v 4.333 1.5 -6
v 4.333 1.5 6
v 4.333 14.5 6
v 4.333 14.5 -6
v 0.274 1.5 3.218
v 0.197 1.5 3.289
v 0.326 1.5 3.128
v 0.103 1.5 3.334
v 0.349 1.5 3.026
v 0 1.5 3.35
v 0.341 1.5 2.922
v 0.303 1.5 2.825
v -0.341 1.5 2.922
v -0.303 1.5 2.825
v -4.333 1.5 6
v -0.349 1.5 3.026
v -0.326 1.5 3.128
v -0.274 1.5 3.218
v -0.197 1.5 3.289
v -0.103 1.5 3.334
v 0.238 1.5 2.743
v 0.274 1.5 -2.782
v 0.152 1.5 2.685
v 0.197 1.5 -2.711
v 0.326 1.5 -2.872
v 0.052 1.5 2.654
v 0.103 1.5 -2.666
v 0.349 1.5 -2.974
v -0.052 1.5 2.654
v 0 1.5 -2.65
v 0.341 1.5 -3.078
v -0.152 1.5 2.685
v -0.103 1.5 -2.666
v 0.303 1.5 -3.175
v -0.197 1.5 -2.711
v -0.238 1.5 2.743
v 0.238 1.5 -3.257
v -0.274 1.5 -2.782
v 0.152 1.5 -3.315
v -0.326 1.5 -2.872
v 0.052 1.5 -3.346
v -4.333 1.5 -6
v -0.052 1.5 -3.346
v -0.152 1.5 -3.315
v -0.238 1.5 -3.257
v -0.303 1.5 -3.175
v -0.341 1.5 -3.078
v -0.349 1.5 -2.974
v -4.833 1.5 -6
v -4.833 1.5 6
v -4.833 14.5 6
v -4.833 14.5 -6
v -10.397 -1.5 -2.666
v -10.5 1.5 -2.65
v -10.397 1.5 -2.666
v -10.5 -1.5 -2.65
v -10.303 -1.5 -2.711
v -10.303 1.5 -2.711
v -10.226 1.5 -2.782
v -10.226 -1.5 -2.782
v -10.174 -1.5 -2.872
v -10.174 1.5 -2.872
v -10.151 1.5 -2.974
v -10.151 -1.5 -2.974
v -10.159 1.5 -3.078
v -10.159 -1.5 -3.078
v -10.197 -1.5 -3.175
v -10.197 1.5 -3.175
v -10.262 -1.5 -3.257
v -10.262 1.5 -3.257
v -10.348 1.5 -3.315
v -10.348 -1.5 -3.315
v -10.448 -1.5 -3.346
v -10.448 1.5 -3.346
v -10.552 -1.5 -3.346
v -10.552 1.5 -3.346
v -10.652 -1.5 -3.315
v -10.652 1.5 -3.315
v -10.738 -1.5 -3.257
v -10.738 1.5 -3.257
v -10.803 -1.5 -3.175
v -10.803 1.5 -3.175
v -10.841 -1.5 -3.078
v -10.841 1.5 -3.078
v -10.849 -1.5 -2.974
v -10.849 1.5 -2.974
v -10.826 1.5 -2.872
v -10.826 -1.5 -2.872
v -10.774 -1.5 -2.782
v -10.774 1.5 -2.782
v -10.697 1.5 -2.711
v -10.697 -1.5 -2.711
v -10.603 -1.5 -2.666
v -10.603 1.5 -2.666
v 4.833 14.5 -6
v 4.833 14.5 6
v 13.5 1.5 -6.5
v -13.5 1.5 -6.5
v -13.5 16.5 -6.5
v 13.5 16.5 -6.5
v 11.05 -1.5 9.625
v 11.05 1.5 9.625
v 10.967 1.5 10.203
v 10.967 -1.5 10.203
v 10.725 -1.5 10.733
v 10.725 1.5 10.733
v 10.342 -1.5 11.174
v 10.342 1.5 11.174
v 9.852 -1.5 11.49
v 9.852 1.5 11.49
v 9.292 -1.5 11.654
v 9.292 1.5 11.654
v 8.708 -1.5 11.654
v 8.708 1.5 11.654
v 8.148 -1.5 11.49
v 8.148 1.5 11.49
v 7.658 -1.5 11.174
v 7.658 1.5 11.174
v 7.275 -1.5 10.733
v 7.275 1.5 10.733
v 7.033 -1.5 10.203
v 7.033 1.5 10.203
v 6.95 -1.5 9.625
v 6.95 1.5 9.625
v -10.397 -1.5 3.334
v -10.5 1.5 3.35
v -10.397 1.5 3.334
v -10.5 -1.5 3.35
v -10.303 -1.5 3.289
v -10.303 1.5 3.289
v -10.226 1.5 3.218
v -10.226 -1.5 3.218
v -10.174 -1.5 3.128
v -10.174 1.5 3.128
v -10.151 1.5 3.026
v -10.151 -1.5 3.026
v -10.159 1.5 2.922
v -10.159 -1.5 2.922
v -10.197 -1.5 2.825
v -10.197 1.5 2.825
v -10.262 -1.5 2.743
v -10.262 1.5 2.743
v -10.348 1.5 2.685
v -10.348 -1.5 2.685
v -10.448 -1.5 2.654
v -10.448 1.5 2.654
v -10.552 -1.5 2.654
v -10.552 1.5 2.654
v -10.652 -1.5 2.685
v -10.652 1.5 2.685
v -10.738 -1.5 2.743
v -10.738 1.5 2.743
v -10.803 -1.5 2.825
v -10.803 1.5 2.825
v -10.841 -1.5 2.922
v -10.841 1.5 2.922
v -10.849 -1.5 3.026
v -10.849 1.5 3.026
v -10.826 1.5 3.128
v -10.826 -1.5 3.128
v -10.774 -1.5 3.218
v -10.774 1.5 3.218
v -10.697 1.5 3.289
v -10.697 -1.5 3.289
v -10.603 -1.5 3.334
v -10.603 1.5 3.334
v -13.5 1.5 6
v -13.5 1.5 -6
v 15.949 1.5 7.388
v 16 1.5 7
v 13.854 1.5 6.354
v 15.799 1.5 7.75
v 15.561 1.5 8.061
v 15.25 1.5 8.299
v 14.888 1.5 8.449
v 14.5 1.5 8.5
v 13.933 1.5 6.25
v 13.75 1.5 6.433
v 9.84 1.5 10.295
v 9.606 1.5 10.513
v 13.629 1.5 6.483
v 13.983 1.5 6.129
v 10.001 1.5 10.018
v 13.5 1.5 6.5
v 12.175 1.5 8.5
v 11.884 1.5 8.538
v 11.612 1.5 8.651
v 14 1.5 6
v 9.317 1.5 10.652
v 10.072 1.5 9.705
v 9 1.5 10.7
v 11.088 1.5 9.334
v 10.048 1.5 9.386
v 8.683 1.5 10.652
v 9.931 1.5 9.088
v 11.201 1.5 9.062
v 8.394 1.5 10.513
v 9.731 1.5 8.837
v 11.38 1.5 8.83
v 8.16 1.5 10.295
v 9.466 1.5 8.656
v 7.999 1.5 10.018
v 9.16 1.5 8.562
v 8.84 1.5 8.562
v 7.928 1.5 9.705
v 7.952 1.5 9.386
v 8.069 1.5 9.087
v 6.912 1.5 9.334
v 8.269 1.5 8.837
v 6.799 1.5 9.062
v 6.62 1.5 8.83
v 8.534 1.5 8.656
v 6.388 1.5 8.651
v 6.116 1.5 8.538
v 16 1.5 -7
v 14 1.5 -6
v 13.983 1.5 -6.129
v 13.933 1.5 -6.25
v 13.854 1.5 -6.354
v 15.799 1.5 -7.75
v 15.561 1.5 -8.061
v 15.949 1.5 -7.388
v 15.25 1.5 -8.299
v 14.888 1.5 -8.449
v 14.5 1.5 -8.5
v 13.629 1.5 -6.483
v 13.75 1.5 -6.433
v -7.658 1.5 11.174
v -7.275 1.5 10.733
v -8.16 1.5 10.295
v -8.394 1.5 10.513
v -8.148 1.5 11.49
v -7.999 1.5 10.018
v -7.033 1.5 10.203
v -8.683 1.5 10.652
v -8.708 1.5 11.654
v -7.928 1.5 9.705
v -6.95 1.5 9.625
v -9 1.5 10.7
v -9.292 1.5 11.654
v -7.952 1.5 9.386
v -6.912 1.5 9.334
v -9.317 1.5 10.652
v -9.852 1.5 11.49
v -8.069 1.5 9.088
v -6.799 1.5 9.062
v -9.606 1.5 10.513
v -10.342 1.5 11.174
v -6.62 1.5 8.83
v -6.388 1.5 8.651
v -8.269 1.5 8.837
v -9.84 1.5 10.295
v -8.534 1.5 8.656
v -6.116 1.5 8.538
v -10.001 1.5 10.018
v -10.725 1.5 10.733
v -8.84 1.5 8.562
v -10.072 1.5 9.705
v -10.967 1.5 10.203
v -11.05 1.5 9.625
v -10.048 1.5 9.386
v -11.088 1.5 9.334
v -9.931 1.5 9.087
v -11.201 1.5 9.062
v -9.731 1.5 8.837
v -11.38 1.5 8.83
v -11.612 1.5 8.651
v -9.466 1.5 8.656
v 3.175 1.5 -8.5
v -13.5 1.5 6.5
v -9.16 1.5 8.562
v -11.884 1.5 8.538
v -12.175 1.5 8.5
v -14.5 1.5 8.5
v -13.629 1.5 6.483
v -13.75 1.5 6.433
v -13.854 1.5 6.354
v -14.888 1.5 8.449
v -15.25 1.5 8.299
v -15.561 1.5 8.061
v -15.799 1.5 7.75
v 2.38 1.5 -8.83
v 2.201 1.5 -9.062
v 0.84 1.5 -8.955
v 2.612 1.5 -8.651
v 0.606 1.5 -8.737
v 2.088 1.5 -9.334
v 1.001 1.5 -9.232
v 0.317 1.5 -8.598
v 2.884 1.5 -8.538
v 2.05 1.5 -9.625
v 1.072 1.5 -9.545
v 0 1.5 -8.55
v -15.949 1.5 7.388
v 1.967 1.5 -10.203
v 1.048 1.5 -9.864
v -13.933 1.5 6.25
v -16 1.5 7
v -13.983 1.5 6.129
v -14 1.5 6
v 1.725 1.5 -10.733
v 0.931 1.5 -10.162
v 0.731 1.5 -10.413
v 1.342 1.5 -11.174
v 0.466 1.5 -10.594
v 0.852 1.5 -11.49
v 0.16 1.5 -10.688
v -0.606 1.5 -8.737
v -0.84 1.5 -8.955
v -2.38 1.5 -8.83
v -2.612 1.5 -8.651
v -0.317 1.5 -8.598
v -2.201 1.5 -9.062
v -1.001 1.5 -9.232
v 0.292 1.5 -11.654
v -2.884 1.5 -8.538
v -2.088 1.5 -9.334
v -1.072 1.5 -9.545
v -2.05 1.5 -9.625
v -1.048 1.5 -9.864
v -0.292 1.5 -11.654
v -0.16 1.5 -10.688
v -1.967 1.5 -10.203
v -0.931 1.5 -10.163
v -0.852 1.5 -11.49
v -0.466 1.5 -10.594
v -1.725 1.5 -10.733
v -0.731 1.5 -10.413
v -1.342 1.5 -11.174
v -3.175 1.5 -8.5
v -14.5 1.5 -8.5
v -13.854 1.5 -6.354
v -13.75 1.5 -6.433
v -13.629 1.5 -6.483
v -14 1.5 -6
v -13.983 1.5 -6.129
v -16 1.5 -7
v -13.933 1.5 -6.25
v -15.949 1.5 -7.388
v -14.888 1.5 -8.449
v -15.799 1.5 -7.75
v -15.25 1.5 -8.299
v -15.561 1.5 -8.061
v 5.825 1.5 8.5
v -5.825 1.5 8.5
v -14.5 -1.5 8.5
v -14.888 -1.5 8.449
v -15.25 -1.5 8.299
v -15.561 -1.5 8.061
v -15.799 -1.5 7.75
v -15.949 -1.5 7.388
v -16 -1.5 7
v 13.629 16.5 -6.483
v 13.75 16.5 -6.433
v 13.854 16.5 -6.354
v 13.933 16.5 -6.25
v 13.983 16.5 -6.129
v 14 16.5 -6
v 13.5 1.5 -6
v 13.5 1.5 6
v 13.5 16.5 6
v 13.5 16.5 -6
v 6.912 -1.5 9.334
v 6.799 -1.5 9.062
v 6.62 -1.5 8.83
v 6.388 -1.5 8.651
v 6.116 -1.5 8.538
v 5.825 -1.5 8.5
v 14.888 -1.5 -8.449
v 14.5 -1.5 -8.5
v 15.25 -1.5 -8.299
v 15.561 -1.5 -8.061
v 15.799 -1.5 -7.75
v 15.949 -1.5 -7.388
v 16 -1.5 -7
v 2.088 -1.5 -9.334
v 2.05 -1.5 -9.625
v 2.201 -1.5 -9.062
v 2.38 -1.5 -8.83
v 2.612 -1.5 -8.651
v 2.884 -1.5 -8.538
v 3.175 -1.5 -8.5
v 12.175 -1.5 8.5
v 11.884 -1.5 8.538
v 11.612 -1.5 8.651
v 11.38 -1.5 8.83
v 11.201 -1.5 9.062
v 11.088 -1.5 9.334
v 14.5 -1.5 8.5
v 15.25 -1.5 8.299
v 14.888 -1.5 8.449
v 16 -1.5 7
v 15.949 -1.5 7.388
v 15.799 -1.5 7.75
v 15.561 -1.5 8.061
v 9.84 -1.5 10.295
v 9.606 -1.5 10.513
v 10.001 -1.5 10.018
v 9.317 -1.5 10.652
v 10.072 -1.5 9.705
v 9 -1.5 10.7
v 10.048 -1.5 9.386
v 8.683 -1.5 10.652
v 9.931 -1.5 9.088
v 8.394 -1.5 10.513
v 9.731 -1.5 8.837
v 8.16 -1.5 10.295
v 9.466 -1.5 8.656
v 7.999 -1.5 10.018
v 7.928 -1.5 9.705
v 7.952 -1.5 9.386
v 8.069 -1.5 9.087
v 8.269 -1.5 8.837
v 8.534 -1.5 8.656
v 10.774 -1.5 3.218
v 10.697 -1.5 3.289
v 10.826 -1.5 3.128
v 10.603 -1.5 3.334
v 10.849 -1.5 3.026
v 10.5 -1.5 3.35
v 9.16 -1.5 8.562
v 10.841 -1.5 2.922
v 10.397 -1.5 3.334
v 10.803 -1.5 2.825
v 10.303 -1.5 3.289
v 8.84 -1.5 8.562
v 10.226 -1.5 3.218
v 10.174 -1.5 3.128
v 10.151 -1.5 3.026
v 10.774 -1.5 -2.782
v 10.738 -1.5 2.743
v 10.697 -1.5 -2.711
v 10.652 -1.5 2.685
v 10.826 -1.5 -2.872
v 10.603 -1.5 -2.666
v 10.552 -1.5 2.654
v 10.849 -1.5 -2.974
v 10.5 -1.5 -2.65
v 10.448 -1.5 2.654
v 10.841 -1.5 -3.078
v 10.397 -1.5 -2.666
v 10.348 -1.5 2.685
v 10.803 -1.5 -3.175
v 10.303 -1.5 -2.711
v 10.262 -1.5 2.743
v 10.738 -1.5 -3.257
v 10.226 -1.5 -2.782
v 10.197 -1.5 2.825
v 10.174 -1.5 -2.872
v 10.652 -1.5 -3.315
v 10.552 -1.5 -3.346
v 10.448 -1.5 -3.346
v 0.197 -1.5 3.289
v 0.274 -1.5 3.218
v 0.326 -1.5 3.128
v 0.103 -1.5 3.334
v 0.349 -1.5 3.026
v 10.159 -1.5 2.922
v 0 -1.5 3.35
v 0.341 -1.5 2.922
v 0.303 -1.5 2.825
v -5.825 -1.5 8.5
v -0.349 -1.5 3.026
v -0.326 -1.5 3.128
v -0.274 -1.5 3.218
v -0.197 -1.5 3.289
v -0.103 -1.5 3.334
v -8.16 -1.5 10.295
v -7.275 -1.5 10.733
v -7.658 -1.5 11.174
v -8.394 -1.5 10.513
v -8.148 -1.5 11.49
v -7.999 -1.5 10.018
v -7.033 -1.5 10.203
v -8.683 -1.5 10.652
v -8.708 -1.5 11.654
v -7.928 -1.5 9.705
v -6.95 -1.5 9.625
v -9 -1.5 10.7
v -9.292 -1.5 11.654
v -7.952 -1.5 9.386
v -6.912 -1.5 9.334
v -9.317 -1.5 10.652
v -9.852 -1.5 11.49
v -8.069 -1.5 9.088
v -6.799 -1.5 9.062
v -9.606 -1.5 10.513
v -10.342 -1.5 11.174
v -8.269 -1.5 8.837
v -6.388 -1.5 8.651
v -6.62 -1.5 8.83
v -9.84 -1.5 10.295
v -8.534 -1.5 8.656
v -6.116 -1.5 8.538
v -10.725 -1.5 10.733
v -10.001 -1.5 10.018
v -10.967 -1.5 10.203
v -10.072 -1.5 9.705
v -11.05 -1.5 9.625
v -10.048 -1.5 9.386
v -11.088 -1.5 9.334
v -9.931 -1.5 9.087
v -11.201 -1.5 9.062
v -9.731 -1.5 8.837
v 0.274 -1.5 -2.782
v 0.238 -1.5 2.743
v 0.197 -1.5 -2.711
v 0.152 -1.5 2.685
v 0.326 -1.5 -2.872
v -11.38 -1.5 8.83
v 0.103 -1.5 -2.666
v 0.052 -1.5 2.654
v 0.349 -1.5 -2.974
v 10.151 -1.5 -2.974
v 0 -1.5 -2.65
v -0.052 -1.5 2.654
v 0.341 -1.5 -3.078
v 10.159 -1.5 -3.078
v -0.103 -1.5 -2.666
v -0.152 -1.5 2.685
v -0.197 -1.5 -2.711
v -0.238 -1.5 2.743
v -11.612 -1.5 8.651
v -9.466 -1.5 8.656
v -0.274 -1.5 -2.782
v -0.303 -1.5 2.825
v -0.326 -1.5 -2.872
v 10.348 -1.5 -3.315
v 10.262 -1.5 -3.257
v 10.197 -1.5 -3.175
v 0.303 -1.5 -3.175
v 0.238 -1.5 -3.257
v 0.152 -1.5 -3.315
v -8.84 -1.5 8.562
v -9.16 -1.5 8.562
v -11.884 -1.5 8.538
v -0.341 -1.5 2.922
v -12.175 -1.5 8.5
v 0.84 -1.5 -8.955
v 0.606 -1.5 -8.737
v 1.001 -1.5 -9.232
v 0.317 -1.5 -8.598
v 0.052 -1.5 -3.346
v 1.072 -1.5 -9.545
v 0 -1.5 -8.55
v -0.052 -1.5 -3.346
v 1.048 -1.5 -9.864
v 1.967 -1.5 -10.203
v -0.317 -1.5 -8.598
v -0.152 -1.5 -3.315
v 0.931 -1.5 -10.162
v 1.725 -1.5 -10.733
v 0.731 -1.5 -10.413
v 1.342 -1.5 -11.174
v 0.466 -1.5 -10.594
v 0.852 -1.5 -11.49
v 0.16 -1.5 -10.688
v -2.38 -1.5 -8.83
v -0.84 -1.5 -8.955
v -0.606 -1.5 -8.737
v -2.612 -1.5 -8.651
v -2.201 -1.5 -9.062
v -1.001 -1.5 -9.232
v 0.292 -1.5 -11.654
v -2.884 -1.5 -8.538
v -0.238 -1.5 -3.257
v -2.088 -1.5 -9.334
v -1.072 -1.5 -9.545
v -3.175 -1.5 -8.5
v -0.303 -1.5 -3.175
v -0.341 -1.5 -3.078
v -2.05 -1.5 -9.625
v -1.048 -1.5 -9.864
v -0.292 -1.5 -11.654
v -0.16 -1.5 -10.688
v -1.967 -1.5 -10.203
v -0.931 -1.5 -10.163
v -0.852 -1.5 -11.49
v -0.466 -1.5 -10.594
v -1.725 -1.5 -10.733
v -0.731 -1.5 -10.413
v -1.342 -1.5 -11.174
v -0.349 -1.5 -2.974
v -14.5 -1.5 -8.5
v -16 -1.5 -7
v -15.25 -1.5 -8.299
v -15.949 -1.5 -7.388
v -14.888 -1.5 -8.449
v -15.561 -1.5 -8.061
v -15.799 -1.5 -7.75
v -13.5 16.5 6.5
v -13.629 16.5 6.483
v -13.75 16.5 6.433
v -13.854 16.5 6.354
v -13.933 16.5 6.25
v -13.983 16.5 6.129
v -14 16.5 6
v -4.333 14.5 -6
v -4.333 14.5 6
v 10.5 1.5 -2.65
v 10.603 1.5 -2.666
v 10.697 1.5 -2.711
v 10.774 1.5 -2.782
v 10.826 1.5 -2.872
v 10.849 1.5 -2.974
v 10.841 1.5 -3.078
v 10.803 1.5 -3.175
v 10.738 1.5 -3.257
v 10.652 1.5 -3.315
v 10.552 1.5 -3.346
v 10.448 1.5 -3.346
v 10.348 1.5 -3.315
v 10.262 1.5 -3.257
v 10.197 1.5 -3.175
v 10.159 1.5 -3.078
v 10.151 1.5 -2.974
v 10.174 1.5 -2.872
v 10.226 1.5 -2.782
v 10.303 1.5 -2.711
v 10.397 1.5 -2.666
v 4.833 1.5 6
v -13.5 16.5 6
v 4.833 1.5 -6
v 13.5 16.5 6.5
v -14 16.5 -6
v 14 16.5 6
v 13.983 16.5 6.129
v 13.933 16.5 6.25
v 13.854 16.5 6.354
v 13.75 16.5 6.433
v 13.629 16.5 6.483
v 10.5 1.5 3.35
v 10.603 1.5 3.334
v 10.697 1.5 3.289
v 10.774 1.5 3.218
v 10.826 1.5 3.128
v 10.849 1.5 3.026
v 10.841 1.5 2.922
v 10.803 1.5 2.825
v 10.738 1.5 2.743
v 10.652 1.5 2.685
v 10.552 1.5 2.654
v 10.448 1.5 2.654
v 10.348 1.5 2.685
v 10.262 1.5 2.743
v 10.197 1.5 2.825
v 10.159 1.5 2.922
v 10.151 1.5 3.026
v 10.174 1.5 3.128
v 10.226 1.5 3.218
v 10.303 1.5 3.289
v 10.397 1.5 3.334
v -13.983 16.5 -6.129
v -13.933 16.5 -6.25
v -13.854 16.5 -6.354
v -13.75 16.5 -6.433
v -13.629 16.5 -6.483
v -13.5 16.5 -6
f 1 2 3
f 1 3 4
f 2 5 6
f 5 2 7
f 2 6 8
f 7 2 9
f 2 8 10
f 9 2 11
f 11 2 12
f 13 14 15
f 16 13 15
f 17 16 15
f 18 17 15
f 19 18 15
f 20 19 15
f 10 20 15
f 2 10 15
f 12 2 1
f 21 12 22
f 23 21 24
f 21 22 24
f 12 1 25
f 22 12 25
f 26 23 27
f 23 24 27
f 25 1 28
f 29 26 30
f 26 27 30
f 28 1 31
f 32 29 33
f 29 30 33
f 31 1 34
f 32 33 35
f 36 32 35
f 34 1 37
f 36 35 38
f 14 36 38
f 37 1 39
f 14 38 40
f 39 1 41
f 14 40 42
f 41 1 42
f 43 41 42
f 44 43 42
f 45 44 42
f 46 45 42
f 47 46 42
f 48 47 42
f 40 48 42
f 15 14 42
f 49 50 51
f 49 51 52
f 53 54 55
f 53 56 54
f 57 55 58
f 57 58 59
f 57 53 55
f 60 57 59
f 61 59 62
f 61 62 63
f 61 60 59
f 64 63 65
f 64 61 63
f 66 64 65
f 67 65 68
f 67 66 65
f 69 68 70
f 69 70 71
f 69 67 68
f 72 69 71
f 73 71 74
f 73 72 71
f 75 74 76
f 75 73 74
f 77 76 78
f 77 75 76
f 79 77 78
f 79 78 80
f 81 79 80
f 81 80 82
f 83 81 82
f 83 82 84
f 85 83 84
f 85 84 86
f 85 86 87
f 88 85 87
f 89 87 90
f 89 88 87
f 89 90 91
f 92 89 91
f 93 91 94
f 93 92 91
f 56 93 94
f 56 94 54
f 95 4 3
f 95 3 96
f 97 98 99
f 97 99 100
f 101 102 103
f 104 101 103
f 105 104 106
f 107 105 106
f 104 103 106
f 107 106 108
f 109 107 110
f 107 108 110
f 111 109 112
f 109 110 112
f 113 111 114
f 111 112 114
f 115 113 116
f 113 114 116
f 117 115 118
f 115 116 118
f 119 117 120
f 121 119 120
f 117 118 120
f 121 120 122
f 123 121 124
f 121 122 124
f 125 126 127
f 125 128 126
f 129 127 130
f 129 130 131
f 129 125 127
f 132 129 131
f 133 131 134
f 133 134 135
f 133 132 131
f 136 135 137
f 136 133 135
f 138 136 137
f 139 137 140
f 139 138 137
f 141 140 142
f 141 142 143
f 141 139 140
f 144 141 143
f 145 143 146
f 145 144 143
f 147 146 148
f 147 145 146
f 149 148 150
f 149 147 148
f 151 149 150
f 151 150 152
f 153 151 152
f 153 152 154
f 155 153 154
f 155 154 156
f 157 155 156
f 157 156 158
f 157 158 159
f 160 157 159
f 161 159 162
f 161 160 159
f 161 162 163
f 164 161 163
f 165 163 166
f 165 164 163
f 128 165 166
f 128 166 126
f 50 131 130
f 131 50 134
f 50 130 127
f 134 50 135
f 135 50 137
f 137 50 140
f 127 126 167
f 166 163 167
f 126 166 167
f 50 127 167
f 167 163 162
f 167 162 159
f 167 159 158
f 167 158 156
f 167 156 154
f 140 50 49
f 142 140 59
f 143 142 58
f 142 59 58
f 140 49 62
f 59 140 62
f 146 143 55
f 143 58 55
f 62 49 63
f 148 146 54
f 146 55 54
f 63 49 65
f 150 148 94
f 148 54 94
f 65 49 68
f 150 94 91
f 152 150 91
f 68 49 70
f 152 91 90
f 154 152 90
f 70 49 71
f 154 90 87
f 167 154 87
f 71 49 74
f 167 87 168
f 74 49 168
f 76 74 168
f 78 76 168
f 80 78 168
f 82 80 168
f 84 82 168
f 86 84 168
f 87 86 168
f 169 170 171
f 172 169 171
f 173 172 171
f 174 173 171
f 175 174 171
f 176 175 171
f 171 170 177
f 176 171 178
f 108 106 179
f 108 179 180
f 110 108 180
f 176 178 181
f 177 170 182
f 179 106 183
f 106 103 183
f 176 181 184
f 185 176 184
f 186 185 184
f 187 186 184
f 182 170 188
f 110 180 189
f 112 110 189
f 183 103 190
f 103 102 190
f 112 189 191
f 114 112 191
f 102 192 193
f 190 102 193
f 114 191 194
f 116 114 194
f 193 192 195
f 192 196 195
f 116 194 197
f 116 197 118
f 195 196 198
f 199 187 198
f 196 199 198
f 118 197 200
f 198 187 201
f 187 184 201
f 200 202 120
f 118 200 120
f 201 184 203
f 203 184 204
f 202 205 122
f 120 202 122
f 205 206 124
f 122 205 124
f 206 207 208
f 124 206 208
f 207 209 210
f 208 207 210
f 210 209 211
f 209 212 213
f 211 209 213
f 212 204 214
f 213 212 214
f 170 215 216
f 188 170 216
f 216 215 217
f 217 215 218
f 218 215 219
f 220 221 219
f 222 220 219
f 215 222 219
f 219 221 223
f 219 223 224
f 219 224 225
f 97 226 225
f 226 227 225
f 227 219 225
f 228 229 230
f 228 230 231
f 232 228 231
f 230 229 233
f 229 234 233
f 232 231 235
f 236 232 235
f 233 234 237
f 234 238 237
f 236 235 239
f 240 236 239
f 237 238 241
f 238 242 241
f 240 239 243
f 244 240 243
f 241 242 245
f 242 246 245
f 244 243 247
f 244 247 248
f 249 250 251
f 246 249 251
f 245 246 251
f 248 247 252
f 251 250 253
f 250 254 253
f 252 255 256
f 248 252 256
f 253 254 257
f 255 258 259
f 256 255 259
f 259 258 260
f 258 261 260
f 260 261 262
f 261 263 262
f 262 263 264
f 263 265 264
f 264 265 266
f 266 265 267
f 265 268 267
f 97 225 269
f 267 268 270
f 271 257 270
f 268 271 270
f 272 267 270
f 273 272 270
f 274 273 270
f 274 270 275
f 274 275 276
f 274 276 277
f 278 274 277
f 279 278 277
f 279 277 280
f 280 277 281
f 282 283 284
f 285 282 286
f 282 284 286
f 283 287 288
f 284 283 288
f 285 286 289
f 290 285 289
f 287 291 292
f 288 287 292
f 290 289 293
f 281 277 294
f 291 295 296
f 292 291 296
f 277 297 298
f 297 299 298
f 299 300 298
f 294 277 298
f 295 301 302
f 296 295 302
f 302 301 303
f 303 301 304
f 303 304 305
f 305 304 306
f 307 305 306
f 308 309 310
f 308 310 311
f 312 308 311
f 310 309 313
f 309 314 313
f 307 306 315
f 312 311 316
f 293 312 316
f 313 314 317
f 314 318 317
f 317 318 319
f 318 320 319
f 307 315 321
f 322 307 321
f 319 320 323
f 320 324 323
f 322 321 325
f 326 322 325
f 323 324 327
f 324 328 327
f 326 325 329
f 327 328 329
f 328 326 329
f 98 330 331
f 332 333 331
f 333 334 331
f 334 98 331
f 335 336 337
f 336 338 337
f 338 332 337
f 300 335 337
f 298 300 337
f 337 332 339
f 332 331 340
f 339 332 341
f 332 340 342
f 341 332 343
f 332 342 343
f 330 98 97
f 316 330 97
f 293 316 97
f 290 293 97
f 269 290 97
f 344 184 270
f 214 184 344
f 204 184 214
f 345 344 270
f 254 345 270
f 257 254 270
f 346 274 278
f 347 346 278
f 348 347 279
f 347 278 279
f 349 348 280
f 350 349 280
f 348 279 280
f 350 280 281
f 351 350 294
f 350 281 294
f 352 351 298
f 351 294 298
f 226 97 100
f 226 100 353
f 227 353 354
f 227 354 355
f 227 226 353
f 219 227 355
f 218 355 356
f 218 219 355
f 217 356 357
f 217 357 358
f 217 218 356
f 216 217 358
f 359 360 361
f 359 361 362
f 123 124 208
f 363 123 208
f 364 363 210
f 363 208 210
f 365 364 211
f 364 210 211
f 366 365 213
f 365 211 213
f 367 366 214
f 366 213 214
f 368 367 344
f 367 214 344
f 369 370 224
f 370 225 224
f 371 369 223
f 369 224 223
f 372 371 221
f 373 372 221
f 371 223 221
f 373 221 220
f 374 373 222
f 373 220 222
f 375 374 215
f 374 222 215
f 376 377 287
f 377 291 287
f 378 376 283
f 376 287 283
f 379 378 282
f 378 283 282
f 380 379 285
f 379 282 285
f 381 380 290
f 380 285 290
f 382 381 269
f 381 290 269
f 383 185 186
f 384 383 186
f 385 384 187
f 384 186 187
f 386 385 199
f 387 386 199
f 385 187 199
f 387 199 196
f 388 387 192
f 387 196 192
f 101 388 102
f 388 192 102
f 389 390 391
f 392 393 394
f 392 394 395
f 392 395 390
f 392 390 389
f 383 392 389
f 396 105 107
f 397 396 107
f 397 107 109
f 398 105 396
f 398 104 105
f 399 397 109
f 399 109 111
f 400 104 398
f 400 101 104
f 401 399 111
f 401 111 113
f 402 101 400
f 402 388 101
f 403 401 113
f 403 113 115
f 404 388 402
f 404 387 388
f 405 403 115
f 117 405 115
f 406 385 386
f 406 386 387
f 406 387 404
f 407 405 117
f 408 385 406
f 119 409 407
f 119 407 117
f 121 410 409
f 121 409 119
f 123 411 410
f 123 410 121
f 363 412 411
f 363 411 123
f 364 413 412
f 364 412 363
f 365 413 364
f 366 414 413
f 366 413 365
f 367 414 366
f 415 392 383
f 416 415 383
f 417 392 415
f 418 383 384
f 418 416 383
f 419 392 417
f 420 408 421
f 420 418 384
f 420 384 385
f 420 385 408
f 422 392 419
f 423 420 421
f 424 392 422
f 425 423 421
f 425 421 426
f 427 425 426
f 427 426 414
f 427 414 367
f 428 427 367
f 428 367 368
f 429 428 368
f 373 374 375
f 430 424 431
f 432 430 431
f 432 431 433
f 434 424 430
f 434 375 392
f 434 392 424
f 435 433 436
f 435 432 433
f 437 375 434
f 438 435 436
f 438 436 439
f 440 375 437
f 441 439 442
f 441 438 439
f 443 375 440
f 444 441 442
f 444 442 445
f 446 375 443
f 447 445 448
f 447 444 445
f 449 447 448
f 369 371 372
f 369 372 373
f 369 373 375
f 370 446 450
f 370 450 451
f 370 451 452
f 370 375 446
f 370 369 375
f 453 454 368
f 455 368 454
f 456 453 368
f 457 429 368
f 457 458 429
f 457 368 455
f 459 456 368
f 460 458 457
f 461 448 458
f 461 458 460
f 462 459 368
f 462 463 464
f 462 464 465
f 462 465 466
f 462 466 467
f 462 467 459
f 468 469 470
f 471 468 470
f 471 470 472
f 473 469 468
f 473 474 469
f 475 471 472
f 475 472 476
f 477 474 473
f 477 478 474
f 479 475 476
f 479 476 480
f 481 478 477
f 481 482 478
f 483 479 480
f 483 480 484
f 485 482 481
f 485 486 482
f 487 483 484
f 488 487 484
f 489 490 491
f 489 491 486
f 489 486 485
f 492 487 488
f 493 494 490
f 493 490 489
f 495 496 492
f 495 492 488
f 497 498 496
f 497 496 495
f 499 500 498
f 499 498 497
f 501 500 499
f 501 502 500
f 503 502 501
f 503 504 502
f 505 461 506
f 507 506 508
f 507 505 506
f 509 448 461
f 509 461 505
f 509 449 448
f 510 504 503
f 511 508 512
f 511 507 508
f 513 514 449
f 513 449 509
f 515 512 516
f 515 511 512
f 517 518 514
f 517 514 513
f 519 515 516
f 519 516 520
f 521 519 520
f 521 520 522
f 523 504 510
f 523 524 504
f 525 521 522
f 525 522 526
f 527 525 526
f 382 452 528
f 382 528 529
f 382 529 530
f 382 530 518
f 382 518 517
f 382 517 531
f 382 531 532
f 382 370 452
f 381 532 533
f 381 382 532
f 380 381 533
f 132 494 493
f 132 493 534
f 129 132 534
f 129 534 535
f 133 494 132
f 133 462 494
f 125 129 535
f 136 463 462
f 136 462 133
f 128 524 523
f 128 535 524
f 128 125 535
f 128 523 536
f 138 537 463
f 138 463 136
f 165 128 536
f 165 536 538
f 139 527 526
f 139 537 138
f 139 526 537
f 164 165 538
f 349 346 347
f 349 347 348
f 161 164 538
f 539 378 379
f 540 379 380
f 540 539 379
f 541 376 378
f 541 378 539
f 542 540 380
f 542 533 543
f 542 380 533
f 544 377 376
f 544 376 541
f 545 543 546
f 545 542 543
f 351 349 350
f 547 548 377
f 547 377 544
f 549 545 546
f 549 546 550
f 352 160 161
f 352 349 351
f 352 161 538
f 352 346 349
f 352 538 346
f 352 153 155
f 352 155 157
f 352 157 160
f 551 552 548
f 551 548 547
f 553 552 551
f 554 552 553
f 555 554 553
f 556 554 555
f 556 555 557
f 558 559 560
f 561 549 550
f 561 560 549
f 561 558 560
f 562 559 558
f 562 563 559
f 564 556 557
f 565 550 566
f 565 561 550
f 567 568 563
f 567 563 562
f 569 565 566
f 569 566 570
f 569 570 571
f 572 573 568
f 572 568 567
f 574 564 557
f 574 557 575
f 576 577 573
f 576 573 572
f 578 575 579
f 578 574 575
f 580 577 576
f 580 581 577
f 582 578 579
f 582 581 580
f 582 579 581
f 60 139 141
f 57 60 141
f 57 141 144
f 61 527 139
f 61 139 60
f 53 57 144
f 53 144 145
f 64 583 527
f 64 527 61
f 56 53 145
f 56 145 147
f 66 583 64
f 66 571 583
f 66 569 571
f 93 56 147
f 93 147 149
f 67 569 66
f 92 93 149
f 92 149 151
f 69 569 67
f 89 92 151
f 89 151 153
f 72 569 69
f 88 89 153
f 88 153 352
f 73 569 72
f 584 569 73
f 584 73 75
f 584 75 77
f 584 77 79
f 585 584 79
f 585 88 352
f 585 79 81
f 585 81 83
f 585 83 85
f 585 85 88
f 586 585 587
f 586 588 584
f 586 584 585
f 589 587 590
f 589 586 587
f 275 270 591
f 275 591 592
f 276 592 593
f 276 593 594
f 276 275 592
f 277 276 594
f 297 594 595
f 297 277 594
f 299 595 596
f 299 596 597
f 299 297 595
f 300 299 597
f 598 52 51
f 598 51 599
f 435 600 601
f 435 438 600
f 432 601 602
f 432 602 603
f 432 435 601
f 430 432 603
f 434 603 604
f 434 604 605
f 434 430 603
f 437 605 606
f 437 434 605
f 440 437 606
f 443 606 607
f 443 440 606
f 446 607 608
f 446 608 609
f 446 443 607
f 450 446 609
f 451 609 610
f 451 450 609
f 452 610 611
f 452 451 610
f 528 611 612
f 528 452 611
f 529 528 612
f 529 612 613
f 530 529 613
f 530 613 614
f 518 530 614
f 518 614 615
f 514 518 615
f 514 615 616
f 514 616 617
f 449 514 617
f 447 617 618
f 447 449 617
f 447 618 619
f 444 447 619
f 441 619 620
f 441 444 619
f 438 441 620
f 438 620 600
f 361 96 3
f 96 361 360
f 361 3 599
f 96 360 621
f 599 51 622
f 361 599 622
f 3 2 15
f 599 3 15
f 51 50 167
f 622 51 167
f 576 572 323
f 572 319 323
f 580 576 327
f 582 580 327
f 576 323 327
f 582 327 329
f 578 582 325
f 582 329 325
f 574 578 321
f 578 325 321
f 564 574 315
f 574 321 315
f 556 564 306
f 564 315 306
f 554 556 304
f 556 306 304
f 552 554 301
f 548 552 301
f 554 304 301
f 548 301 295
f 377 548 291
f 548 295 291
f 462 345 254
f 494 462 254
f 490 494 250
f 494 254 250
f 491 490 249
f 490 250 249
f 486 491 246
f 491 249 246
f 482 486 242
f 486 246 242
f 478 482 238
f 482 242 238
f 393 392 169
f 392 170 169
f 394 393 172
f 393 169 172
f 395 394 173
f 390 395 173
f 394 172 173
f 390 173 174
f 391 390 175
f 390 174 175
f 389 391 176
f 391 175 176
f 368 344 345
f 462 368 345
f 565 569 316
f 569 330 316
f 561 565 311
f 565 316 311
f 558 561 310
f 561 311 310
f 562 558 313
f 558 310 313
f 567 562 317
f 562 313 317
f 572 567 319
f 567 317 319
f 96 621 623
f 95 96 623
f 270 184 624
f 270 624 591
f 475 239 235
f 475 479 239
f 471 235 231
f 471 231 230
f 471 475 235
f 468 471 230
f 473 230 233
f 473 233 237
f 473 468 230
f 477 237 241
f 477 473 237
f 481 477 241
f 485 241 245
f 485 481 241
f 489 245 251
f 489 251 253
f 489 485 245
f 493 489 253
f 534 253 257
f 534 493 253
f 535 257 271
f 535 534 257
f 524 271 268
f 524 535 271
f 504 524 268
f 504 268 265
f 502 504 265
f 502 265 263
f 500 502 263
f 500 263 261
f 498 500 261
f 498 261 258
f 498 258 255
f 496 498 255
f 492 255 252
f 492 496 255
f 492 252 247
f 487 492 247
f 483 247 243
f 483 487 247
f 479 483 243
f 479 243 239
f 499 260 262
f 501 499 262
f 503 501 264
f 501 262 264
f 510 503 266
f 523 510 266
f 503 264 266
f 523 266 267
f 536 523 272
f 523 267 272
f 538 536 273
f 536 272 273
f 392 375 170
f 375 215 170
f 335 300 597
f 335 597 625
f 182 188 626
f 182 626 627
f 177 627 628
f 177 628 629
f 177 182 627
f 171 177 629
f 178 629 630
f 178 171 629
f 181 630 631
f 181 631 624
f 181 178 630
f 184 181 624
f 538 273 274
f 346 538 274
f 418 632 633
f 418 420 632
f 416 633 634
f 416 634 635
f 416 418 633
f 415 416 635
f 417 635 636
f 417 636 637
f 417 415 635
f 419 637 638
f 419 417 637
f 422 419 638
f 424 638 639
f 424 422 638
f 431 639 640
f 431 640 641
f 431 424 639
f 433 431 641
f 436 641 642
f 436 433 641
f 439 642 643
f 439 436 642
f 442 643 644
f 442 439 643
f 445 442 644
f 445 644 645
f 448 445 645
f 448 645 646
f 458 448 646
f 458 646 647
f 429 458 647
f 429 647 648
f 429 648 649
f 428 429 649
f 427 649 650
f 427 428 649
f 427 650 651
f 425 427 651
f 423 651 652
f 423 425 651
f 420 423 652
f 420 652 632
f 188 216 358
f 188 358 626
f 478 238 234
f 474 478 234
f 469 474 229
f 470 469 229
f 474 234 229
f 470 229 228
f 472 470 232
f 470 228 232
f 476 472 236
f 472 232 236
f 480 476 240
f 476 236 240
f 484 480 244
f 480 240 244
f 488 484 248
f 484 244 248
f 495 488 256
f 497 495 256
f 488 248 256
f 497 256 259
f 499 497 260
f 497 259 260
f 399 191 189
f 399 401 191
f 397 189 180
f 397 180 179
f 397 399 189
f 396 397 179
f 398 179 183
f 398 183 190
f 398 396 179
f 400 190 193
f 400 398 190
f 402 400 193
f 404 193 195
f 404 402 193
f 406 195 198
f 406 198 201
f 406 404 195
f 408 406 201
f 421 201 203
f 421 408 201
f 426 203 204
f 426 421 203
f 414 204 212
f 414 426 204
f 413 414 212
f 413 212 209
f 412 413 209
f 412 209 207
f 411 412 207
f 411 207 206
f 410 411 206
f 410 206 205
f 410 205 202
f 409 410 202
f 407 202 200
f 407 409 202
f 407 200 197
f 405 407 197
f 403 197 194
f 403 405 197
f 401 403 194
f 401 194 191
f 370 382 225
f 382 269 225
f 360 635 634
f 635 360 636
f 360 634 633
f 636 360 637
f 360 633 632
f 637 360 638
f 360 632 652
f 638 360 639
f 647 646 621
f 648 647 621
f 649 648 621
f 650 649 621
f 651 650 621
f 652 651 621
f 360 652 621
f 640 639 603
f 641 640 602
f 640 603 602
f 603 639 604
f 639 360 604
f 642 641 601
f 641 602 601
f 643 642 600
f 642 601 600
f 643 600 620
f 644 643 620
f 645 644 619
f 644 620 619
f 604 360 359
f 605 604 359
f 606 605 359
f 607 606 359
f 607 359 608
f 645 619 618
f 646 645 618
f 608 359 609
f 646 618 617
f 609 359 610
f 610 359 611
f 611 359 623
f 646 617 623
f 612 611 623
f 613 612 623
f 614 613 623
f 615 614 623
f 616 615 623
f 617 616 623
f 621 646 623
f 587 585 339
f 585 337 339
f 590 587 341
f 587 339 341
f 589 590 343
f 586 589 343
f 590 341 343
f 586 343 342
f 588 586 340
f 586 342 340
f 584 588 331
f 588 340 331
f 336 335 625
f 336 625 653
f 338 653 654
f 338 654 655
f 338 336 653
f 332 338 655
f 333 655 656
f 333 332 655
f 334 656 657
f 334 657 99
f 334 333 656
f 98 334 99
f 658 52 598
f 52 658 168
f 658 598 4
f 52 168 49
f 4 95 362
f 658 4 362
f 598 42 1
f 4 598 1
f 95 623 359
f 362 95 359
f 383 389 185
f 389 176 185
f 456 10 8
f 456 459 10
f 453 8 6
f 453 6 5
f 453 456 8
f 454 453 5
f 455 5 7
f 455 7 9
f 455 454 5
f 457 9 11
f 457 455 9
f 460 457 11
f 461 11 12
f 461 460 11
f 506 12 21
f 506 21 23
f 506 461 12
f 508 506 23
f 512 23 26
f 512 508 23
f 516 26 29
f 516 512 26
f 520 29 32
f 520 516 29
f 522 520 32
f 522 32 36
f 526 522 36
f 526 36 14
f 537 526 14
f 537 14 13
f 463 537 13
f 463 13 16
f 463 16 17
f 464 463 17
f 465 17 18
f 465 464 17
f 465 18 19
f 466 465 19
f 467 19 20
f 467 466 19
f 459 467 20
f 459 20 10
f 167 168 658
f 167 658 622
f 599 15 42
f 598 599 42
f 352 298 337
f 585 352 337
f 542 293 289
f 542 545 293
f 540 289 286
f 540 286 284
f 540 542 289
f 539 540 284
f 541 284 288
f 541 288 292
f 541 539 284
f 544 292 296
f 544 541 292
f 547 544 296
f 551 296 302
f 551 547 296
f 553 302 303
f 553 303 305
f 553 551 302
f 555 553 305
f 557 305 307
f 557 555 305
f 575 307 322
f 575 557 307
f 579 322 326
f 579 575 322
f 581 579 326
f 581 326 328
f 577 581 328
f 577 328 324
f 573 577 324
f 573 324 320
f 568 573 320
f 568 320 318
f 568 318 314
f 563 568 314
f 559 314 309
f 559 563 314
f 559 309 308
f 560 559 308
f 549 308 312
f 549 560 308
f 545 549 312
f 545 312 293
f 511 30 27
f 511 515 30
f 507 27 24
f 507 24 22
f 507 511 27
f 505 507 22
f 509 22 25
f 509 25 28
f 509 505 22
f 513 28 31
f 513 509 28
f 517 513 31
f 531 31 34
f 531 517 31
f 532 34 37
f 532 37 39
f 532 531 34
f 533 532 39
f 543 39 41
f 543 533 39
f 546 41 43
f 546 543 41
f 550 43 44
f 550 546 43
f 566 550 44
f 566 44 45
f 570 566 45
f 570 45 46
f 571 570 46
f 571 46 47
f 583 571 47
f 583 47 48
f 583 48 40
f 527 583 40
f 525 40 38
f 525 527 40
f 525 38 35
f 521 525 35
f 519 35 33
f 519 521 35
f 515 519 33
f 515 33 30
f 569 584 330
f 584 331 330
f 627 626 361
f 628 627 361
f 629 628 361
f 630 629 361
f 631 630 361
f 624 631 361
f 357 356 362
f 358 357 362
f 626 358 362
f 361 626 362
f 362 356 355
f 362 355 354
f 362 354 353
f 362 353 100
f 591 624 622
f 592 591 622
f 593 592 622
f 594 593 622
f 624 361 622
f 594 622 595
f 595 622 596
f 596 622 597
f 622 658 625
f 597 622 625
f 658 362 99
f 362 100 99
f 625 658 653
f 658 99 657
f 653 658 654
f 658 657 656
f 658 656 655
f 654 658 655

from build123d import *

# Parameters (mm, degrees)
BASE_PLATE_AND_PORTS_2_R   = 0.35
BASE_PLATE_AND_PORTS_2_R_2 = 1.075
BASE_PLATE_AND_PORTS_DEPTH = 1.5
BOSS_EXTRUDE1_DEPTH        = 15
RESERVOIRS_3_W             = 0.5
RESERVOIRS_3_H             = 12
BOSS_EXTRUDE2_DEPTH        = 13


with BuildPart() as part:
    # Base-plate and ports 2 → Base plate and ports (new, symmetric)
    with BuildSketch(Plane(origin=(0, 0, 0), x_dir=(1, 0, 0), z_dir=(0, 1, 0))):
        with BuildLine():
            Line((-16, -7), (-16, 7))
            ThreePointArc((-16, 7), (-15.560660172, 8.060660172), (-14.5, 8.5))
            Line((-14.5, 8.5), (-3.175, 8.5))
            ThreePointArc((-3.175, 8.5), (-2.379504871, 8.829504871), (-2.05, 9.625))
            ThreePointArc((-2.05, 9.625), (0, 11.675), (2.05, 9.625))
            ThreePointArc((2.05, 9.625), (2.379504871, 8.829504871), (3.175, 8.5))
            Line((3.175, 8.5), (14.5, 8.5))
            ThreePointArc((14.5, 8.5), (15.560660172, 8.060660172), (16, 7))
            Line((16, 7), (16, -7))
            ThreePointArc((16, -7), (15.560660172, -8.060660172), (14.5, -8.5))
            Line((14.5, -8.5), (12.175, -8.5))
            ThreePointArc((12.175, -8.5), (11.379504871, -8.829504871), (11.05, -9.625))
            ThreePointArc((11.05, -9.625), (9, -11.675), (6.95, -9.625))
            ThreePointArc((6.95, -9.625), (6.620495129, -8.829504871), (5.825, -8.5))
            Line((5.825, -8.5), (-5.825, -8.5))
            ThreePointArc((-5.825, -8.5), (-6.620495129, -8.829504871), (-6.95, -9.625))
            ThreePointArc((-6.95, -9.625), (-9, -11.675), (-11.05, -9.625))
            ThreePointArc((-11.05, -9.625), (-11.379504871, -8.829504871), (-12.175, -8.5))
            Line((-12.175, -8.5), (-14.5, -8.5))
            ThreePointArc((-14.5, -8.5), (-15.560660172, -8.060660172), (-16, -7))
        make_face()
        with Locations(Location((-10.5, 3, 0), (0, 0, 270))):
            Circle(BASE_PLATE_AND_PORTS_2_R, mode=Mode.SUBTRACT)
        with Locations(Location((0, 3, 0), (0, 0, 270))):
            Circle(BASE_PLATE_AND_PORTS_2_R, mode=Mode.SUBTRACT)
        with Locations(Location((10.5, 3, 0), (0, 0, 270))):
            Circle(BASE_PLATE_AND_PORTS_2_R, mode=Mode.SUBTRACT)
        with Locations(Location((0, -3, 0), (0, 0, 270))):
            Circle(BASE_PLATE_AND_PORTS_2_R, mode=Mode.SUBTRACT)
        with Locations(Location((10.5, -3, 0), (0, 0, 270))):
            Circle(BASE_PLATE_AND_PORTS_2_R, mode=Mode.SUBTRACT)
        with Locations(Location((-10.5, -3, 0), (0, 0, 270))):
            Circle(BASE_PLATE_AND_PORTS_2_R, mode=Mode.SUBTRACT)
        with Locations(Location((0, 9.625, 0), (0, 0, 270))):
            Circle(BASE_PLATE_AND_PORTS_2_R_2, mode=Mode.SUBTRACT)
        with Locations(Location((-9, -9.625, 0), (0, 0, 270))):
            Circle(BASE_PLATE_AND_PORTS_2_R_2, mode=Mode.SUBTRACT)
        with Locations(Location((9, -9.625, 0), (0, 0, 270))):
            Circle(BASE_PLATE_AND_PORTS_2_R_2, mode=Mode.SUBTRACT)
    extrude(amount=BASE_PLATE_AND_PORTS_DEPTH, both=True)

    # Reservoirs → Boss-Extrude1 (add)
    with BuildSketch(Plane(origin=(0, 1.5, 0), x_dir=(1, 0, 0), z_dir=(0, 1, 0))):
        with BuildLine():
            Line((-13.5, 6.5), (13.5, 6.5))
            ThreePointArc((13.5, 6.5), (13.853553391, 6.353553391), (14, 6))
            Line((14, 6), (14, -6))
            ThreePointArc((14, -6), (13.853553391, -6.353553391), (13.5, -6.5))
            Line((13.5, -6.5), (-13.5, -6.5))
            ThreePointArc((-13.5, -6.5), (-13.853553391, -6.353553391), (-14, -6))
            Line((-14, -6), (-14, 6))
            ThreePointArc((-14, 6), (-13.853553391, 6.353553391), (-13.5, 6.5))
        make_face()
        Polygon((-4.333333333, -6), (4.333333333, -6), (4.833333333, -6), (13.5, -6), (13.5, 6), (4.833333333, 6), (4.333333333, 6), (-4.333333333, 6), (-4.833333333, 6), (-13.5, 6), (-13.5, -6), (-4.833333333, -6), align=None, mode=Mode.SUBTRACT)
    extrude(amount=BOSS_EXTRUDE1_DEPTH)

    # Reservoirs<3> → Boss-Extrude2 (add)
    with BuildSketch(Plane(origin=(0, 1.5, 0), x_dir=(1, 0, 0), z_dir=(0, 1, 0))):
        with Locations((-4.583333333, 0)):
            Rectangle(RESERVOIRS_3_W, RESERVOIRS_3_H)
        with Locations((4.583333333, 0)):
            Rectangle(RESERVOIRS_3_W, RESERVOIRS_3_H)
    extrude(amount=BOSS_EXTRUDE2_DEPTH)


solid = part.part
